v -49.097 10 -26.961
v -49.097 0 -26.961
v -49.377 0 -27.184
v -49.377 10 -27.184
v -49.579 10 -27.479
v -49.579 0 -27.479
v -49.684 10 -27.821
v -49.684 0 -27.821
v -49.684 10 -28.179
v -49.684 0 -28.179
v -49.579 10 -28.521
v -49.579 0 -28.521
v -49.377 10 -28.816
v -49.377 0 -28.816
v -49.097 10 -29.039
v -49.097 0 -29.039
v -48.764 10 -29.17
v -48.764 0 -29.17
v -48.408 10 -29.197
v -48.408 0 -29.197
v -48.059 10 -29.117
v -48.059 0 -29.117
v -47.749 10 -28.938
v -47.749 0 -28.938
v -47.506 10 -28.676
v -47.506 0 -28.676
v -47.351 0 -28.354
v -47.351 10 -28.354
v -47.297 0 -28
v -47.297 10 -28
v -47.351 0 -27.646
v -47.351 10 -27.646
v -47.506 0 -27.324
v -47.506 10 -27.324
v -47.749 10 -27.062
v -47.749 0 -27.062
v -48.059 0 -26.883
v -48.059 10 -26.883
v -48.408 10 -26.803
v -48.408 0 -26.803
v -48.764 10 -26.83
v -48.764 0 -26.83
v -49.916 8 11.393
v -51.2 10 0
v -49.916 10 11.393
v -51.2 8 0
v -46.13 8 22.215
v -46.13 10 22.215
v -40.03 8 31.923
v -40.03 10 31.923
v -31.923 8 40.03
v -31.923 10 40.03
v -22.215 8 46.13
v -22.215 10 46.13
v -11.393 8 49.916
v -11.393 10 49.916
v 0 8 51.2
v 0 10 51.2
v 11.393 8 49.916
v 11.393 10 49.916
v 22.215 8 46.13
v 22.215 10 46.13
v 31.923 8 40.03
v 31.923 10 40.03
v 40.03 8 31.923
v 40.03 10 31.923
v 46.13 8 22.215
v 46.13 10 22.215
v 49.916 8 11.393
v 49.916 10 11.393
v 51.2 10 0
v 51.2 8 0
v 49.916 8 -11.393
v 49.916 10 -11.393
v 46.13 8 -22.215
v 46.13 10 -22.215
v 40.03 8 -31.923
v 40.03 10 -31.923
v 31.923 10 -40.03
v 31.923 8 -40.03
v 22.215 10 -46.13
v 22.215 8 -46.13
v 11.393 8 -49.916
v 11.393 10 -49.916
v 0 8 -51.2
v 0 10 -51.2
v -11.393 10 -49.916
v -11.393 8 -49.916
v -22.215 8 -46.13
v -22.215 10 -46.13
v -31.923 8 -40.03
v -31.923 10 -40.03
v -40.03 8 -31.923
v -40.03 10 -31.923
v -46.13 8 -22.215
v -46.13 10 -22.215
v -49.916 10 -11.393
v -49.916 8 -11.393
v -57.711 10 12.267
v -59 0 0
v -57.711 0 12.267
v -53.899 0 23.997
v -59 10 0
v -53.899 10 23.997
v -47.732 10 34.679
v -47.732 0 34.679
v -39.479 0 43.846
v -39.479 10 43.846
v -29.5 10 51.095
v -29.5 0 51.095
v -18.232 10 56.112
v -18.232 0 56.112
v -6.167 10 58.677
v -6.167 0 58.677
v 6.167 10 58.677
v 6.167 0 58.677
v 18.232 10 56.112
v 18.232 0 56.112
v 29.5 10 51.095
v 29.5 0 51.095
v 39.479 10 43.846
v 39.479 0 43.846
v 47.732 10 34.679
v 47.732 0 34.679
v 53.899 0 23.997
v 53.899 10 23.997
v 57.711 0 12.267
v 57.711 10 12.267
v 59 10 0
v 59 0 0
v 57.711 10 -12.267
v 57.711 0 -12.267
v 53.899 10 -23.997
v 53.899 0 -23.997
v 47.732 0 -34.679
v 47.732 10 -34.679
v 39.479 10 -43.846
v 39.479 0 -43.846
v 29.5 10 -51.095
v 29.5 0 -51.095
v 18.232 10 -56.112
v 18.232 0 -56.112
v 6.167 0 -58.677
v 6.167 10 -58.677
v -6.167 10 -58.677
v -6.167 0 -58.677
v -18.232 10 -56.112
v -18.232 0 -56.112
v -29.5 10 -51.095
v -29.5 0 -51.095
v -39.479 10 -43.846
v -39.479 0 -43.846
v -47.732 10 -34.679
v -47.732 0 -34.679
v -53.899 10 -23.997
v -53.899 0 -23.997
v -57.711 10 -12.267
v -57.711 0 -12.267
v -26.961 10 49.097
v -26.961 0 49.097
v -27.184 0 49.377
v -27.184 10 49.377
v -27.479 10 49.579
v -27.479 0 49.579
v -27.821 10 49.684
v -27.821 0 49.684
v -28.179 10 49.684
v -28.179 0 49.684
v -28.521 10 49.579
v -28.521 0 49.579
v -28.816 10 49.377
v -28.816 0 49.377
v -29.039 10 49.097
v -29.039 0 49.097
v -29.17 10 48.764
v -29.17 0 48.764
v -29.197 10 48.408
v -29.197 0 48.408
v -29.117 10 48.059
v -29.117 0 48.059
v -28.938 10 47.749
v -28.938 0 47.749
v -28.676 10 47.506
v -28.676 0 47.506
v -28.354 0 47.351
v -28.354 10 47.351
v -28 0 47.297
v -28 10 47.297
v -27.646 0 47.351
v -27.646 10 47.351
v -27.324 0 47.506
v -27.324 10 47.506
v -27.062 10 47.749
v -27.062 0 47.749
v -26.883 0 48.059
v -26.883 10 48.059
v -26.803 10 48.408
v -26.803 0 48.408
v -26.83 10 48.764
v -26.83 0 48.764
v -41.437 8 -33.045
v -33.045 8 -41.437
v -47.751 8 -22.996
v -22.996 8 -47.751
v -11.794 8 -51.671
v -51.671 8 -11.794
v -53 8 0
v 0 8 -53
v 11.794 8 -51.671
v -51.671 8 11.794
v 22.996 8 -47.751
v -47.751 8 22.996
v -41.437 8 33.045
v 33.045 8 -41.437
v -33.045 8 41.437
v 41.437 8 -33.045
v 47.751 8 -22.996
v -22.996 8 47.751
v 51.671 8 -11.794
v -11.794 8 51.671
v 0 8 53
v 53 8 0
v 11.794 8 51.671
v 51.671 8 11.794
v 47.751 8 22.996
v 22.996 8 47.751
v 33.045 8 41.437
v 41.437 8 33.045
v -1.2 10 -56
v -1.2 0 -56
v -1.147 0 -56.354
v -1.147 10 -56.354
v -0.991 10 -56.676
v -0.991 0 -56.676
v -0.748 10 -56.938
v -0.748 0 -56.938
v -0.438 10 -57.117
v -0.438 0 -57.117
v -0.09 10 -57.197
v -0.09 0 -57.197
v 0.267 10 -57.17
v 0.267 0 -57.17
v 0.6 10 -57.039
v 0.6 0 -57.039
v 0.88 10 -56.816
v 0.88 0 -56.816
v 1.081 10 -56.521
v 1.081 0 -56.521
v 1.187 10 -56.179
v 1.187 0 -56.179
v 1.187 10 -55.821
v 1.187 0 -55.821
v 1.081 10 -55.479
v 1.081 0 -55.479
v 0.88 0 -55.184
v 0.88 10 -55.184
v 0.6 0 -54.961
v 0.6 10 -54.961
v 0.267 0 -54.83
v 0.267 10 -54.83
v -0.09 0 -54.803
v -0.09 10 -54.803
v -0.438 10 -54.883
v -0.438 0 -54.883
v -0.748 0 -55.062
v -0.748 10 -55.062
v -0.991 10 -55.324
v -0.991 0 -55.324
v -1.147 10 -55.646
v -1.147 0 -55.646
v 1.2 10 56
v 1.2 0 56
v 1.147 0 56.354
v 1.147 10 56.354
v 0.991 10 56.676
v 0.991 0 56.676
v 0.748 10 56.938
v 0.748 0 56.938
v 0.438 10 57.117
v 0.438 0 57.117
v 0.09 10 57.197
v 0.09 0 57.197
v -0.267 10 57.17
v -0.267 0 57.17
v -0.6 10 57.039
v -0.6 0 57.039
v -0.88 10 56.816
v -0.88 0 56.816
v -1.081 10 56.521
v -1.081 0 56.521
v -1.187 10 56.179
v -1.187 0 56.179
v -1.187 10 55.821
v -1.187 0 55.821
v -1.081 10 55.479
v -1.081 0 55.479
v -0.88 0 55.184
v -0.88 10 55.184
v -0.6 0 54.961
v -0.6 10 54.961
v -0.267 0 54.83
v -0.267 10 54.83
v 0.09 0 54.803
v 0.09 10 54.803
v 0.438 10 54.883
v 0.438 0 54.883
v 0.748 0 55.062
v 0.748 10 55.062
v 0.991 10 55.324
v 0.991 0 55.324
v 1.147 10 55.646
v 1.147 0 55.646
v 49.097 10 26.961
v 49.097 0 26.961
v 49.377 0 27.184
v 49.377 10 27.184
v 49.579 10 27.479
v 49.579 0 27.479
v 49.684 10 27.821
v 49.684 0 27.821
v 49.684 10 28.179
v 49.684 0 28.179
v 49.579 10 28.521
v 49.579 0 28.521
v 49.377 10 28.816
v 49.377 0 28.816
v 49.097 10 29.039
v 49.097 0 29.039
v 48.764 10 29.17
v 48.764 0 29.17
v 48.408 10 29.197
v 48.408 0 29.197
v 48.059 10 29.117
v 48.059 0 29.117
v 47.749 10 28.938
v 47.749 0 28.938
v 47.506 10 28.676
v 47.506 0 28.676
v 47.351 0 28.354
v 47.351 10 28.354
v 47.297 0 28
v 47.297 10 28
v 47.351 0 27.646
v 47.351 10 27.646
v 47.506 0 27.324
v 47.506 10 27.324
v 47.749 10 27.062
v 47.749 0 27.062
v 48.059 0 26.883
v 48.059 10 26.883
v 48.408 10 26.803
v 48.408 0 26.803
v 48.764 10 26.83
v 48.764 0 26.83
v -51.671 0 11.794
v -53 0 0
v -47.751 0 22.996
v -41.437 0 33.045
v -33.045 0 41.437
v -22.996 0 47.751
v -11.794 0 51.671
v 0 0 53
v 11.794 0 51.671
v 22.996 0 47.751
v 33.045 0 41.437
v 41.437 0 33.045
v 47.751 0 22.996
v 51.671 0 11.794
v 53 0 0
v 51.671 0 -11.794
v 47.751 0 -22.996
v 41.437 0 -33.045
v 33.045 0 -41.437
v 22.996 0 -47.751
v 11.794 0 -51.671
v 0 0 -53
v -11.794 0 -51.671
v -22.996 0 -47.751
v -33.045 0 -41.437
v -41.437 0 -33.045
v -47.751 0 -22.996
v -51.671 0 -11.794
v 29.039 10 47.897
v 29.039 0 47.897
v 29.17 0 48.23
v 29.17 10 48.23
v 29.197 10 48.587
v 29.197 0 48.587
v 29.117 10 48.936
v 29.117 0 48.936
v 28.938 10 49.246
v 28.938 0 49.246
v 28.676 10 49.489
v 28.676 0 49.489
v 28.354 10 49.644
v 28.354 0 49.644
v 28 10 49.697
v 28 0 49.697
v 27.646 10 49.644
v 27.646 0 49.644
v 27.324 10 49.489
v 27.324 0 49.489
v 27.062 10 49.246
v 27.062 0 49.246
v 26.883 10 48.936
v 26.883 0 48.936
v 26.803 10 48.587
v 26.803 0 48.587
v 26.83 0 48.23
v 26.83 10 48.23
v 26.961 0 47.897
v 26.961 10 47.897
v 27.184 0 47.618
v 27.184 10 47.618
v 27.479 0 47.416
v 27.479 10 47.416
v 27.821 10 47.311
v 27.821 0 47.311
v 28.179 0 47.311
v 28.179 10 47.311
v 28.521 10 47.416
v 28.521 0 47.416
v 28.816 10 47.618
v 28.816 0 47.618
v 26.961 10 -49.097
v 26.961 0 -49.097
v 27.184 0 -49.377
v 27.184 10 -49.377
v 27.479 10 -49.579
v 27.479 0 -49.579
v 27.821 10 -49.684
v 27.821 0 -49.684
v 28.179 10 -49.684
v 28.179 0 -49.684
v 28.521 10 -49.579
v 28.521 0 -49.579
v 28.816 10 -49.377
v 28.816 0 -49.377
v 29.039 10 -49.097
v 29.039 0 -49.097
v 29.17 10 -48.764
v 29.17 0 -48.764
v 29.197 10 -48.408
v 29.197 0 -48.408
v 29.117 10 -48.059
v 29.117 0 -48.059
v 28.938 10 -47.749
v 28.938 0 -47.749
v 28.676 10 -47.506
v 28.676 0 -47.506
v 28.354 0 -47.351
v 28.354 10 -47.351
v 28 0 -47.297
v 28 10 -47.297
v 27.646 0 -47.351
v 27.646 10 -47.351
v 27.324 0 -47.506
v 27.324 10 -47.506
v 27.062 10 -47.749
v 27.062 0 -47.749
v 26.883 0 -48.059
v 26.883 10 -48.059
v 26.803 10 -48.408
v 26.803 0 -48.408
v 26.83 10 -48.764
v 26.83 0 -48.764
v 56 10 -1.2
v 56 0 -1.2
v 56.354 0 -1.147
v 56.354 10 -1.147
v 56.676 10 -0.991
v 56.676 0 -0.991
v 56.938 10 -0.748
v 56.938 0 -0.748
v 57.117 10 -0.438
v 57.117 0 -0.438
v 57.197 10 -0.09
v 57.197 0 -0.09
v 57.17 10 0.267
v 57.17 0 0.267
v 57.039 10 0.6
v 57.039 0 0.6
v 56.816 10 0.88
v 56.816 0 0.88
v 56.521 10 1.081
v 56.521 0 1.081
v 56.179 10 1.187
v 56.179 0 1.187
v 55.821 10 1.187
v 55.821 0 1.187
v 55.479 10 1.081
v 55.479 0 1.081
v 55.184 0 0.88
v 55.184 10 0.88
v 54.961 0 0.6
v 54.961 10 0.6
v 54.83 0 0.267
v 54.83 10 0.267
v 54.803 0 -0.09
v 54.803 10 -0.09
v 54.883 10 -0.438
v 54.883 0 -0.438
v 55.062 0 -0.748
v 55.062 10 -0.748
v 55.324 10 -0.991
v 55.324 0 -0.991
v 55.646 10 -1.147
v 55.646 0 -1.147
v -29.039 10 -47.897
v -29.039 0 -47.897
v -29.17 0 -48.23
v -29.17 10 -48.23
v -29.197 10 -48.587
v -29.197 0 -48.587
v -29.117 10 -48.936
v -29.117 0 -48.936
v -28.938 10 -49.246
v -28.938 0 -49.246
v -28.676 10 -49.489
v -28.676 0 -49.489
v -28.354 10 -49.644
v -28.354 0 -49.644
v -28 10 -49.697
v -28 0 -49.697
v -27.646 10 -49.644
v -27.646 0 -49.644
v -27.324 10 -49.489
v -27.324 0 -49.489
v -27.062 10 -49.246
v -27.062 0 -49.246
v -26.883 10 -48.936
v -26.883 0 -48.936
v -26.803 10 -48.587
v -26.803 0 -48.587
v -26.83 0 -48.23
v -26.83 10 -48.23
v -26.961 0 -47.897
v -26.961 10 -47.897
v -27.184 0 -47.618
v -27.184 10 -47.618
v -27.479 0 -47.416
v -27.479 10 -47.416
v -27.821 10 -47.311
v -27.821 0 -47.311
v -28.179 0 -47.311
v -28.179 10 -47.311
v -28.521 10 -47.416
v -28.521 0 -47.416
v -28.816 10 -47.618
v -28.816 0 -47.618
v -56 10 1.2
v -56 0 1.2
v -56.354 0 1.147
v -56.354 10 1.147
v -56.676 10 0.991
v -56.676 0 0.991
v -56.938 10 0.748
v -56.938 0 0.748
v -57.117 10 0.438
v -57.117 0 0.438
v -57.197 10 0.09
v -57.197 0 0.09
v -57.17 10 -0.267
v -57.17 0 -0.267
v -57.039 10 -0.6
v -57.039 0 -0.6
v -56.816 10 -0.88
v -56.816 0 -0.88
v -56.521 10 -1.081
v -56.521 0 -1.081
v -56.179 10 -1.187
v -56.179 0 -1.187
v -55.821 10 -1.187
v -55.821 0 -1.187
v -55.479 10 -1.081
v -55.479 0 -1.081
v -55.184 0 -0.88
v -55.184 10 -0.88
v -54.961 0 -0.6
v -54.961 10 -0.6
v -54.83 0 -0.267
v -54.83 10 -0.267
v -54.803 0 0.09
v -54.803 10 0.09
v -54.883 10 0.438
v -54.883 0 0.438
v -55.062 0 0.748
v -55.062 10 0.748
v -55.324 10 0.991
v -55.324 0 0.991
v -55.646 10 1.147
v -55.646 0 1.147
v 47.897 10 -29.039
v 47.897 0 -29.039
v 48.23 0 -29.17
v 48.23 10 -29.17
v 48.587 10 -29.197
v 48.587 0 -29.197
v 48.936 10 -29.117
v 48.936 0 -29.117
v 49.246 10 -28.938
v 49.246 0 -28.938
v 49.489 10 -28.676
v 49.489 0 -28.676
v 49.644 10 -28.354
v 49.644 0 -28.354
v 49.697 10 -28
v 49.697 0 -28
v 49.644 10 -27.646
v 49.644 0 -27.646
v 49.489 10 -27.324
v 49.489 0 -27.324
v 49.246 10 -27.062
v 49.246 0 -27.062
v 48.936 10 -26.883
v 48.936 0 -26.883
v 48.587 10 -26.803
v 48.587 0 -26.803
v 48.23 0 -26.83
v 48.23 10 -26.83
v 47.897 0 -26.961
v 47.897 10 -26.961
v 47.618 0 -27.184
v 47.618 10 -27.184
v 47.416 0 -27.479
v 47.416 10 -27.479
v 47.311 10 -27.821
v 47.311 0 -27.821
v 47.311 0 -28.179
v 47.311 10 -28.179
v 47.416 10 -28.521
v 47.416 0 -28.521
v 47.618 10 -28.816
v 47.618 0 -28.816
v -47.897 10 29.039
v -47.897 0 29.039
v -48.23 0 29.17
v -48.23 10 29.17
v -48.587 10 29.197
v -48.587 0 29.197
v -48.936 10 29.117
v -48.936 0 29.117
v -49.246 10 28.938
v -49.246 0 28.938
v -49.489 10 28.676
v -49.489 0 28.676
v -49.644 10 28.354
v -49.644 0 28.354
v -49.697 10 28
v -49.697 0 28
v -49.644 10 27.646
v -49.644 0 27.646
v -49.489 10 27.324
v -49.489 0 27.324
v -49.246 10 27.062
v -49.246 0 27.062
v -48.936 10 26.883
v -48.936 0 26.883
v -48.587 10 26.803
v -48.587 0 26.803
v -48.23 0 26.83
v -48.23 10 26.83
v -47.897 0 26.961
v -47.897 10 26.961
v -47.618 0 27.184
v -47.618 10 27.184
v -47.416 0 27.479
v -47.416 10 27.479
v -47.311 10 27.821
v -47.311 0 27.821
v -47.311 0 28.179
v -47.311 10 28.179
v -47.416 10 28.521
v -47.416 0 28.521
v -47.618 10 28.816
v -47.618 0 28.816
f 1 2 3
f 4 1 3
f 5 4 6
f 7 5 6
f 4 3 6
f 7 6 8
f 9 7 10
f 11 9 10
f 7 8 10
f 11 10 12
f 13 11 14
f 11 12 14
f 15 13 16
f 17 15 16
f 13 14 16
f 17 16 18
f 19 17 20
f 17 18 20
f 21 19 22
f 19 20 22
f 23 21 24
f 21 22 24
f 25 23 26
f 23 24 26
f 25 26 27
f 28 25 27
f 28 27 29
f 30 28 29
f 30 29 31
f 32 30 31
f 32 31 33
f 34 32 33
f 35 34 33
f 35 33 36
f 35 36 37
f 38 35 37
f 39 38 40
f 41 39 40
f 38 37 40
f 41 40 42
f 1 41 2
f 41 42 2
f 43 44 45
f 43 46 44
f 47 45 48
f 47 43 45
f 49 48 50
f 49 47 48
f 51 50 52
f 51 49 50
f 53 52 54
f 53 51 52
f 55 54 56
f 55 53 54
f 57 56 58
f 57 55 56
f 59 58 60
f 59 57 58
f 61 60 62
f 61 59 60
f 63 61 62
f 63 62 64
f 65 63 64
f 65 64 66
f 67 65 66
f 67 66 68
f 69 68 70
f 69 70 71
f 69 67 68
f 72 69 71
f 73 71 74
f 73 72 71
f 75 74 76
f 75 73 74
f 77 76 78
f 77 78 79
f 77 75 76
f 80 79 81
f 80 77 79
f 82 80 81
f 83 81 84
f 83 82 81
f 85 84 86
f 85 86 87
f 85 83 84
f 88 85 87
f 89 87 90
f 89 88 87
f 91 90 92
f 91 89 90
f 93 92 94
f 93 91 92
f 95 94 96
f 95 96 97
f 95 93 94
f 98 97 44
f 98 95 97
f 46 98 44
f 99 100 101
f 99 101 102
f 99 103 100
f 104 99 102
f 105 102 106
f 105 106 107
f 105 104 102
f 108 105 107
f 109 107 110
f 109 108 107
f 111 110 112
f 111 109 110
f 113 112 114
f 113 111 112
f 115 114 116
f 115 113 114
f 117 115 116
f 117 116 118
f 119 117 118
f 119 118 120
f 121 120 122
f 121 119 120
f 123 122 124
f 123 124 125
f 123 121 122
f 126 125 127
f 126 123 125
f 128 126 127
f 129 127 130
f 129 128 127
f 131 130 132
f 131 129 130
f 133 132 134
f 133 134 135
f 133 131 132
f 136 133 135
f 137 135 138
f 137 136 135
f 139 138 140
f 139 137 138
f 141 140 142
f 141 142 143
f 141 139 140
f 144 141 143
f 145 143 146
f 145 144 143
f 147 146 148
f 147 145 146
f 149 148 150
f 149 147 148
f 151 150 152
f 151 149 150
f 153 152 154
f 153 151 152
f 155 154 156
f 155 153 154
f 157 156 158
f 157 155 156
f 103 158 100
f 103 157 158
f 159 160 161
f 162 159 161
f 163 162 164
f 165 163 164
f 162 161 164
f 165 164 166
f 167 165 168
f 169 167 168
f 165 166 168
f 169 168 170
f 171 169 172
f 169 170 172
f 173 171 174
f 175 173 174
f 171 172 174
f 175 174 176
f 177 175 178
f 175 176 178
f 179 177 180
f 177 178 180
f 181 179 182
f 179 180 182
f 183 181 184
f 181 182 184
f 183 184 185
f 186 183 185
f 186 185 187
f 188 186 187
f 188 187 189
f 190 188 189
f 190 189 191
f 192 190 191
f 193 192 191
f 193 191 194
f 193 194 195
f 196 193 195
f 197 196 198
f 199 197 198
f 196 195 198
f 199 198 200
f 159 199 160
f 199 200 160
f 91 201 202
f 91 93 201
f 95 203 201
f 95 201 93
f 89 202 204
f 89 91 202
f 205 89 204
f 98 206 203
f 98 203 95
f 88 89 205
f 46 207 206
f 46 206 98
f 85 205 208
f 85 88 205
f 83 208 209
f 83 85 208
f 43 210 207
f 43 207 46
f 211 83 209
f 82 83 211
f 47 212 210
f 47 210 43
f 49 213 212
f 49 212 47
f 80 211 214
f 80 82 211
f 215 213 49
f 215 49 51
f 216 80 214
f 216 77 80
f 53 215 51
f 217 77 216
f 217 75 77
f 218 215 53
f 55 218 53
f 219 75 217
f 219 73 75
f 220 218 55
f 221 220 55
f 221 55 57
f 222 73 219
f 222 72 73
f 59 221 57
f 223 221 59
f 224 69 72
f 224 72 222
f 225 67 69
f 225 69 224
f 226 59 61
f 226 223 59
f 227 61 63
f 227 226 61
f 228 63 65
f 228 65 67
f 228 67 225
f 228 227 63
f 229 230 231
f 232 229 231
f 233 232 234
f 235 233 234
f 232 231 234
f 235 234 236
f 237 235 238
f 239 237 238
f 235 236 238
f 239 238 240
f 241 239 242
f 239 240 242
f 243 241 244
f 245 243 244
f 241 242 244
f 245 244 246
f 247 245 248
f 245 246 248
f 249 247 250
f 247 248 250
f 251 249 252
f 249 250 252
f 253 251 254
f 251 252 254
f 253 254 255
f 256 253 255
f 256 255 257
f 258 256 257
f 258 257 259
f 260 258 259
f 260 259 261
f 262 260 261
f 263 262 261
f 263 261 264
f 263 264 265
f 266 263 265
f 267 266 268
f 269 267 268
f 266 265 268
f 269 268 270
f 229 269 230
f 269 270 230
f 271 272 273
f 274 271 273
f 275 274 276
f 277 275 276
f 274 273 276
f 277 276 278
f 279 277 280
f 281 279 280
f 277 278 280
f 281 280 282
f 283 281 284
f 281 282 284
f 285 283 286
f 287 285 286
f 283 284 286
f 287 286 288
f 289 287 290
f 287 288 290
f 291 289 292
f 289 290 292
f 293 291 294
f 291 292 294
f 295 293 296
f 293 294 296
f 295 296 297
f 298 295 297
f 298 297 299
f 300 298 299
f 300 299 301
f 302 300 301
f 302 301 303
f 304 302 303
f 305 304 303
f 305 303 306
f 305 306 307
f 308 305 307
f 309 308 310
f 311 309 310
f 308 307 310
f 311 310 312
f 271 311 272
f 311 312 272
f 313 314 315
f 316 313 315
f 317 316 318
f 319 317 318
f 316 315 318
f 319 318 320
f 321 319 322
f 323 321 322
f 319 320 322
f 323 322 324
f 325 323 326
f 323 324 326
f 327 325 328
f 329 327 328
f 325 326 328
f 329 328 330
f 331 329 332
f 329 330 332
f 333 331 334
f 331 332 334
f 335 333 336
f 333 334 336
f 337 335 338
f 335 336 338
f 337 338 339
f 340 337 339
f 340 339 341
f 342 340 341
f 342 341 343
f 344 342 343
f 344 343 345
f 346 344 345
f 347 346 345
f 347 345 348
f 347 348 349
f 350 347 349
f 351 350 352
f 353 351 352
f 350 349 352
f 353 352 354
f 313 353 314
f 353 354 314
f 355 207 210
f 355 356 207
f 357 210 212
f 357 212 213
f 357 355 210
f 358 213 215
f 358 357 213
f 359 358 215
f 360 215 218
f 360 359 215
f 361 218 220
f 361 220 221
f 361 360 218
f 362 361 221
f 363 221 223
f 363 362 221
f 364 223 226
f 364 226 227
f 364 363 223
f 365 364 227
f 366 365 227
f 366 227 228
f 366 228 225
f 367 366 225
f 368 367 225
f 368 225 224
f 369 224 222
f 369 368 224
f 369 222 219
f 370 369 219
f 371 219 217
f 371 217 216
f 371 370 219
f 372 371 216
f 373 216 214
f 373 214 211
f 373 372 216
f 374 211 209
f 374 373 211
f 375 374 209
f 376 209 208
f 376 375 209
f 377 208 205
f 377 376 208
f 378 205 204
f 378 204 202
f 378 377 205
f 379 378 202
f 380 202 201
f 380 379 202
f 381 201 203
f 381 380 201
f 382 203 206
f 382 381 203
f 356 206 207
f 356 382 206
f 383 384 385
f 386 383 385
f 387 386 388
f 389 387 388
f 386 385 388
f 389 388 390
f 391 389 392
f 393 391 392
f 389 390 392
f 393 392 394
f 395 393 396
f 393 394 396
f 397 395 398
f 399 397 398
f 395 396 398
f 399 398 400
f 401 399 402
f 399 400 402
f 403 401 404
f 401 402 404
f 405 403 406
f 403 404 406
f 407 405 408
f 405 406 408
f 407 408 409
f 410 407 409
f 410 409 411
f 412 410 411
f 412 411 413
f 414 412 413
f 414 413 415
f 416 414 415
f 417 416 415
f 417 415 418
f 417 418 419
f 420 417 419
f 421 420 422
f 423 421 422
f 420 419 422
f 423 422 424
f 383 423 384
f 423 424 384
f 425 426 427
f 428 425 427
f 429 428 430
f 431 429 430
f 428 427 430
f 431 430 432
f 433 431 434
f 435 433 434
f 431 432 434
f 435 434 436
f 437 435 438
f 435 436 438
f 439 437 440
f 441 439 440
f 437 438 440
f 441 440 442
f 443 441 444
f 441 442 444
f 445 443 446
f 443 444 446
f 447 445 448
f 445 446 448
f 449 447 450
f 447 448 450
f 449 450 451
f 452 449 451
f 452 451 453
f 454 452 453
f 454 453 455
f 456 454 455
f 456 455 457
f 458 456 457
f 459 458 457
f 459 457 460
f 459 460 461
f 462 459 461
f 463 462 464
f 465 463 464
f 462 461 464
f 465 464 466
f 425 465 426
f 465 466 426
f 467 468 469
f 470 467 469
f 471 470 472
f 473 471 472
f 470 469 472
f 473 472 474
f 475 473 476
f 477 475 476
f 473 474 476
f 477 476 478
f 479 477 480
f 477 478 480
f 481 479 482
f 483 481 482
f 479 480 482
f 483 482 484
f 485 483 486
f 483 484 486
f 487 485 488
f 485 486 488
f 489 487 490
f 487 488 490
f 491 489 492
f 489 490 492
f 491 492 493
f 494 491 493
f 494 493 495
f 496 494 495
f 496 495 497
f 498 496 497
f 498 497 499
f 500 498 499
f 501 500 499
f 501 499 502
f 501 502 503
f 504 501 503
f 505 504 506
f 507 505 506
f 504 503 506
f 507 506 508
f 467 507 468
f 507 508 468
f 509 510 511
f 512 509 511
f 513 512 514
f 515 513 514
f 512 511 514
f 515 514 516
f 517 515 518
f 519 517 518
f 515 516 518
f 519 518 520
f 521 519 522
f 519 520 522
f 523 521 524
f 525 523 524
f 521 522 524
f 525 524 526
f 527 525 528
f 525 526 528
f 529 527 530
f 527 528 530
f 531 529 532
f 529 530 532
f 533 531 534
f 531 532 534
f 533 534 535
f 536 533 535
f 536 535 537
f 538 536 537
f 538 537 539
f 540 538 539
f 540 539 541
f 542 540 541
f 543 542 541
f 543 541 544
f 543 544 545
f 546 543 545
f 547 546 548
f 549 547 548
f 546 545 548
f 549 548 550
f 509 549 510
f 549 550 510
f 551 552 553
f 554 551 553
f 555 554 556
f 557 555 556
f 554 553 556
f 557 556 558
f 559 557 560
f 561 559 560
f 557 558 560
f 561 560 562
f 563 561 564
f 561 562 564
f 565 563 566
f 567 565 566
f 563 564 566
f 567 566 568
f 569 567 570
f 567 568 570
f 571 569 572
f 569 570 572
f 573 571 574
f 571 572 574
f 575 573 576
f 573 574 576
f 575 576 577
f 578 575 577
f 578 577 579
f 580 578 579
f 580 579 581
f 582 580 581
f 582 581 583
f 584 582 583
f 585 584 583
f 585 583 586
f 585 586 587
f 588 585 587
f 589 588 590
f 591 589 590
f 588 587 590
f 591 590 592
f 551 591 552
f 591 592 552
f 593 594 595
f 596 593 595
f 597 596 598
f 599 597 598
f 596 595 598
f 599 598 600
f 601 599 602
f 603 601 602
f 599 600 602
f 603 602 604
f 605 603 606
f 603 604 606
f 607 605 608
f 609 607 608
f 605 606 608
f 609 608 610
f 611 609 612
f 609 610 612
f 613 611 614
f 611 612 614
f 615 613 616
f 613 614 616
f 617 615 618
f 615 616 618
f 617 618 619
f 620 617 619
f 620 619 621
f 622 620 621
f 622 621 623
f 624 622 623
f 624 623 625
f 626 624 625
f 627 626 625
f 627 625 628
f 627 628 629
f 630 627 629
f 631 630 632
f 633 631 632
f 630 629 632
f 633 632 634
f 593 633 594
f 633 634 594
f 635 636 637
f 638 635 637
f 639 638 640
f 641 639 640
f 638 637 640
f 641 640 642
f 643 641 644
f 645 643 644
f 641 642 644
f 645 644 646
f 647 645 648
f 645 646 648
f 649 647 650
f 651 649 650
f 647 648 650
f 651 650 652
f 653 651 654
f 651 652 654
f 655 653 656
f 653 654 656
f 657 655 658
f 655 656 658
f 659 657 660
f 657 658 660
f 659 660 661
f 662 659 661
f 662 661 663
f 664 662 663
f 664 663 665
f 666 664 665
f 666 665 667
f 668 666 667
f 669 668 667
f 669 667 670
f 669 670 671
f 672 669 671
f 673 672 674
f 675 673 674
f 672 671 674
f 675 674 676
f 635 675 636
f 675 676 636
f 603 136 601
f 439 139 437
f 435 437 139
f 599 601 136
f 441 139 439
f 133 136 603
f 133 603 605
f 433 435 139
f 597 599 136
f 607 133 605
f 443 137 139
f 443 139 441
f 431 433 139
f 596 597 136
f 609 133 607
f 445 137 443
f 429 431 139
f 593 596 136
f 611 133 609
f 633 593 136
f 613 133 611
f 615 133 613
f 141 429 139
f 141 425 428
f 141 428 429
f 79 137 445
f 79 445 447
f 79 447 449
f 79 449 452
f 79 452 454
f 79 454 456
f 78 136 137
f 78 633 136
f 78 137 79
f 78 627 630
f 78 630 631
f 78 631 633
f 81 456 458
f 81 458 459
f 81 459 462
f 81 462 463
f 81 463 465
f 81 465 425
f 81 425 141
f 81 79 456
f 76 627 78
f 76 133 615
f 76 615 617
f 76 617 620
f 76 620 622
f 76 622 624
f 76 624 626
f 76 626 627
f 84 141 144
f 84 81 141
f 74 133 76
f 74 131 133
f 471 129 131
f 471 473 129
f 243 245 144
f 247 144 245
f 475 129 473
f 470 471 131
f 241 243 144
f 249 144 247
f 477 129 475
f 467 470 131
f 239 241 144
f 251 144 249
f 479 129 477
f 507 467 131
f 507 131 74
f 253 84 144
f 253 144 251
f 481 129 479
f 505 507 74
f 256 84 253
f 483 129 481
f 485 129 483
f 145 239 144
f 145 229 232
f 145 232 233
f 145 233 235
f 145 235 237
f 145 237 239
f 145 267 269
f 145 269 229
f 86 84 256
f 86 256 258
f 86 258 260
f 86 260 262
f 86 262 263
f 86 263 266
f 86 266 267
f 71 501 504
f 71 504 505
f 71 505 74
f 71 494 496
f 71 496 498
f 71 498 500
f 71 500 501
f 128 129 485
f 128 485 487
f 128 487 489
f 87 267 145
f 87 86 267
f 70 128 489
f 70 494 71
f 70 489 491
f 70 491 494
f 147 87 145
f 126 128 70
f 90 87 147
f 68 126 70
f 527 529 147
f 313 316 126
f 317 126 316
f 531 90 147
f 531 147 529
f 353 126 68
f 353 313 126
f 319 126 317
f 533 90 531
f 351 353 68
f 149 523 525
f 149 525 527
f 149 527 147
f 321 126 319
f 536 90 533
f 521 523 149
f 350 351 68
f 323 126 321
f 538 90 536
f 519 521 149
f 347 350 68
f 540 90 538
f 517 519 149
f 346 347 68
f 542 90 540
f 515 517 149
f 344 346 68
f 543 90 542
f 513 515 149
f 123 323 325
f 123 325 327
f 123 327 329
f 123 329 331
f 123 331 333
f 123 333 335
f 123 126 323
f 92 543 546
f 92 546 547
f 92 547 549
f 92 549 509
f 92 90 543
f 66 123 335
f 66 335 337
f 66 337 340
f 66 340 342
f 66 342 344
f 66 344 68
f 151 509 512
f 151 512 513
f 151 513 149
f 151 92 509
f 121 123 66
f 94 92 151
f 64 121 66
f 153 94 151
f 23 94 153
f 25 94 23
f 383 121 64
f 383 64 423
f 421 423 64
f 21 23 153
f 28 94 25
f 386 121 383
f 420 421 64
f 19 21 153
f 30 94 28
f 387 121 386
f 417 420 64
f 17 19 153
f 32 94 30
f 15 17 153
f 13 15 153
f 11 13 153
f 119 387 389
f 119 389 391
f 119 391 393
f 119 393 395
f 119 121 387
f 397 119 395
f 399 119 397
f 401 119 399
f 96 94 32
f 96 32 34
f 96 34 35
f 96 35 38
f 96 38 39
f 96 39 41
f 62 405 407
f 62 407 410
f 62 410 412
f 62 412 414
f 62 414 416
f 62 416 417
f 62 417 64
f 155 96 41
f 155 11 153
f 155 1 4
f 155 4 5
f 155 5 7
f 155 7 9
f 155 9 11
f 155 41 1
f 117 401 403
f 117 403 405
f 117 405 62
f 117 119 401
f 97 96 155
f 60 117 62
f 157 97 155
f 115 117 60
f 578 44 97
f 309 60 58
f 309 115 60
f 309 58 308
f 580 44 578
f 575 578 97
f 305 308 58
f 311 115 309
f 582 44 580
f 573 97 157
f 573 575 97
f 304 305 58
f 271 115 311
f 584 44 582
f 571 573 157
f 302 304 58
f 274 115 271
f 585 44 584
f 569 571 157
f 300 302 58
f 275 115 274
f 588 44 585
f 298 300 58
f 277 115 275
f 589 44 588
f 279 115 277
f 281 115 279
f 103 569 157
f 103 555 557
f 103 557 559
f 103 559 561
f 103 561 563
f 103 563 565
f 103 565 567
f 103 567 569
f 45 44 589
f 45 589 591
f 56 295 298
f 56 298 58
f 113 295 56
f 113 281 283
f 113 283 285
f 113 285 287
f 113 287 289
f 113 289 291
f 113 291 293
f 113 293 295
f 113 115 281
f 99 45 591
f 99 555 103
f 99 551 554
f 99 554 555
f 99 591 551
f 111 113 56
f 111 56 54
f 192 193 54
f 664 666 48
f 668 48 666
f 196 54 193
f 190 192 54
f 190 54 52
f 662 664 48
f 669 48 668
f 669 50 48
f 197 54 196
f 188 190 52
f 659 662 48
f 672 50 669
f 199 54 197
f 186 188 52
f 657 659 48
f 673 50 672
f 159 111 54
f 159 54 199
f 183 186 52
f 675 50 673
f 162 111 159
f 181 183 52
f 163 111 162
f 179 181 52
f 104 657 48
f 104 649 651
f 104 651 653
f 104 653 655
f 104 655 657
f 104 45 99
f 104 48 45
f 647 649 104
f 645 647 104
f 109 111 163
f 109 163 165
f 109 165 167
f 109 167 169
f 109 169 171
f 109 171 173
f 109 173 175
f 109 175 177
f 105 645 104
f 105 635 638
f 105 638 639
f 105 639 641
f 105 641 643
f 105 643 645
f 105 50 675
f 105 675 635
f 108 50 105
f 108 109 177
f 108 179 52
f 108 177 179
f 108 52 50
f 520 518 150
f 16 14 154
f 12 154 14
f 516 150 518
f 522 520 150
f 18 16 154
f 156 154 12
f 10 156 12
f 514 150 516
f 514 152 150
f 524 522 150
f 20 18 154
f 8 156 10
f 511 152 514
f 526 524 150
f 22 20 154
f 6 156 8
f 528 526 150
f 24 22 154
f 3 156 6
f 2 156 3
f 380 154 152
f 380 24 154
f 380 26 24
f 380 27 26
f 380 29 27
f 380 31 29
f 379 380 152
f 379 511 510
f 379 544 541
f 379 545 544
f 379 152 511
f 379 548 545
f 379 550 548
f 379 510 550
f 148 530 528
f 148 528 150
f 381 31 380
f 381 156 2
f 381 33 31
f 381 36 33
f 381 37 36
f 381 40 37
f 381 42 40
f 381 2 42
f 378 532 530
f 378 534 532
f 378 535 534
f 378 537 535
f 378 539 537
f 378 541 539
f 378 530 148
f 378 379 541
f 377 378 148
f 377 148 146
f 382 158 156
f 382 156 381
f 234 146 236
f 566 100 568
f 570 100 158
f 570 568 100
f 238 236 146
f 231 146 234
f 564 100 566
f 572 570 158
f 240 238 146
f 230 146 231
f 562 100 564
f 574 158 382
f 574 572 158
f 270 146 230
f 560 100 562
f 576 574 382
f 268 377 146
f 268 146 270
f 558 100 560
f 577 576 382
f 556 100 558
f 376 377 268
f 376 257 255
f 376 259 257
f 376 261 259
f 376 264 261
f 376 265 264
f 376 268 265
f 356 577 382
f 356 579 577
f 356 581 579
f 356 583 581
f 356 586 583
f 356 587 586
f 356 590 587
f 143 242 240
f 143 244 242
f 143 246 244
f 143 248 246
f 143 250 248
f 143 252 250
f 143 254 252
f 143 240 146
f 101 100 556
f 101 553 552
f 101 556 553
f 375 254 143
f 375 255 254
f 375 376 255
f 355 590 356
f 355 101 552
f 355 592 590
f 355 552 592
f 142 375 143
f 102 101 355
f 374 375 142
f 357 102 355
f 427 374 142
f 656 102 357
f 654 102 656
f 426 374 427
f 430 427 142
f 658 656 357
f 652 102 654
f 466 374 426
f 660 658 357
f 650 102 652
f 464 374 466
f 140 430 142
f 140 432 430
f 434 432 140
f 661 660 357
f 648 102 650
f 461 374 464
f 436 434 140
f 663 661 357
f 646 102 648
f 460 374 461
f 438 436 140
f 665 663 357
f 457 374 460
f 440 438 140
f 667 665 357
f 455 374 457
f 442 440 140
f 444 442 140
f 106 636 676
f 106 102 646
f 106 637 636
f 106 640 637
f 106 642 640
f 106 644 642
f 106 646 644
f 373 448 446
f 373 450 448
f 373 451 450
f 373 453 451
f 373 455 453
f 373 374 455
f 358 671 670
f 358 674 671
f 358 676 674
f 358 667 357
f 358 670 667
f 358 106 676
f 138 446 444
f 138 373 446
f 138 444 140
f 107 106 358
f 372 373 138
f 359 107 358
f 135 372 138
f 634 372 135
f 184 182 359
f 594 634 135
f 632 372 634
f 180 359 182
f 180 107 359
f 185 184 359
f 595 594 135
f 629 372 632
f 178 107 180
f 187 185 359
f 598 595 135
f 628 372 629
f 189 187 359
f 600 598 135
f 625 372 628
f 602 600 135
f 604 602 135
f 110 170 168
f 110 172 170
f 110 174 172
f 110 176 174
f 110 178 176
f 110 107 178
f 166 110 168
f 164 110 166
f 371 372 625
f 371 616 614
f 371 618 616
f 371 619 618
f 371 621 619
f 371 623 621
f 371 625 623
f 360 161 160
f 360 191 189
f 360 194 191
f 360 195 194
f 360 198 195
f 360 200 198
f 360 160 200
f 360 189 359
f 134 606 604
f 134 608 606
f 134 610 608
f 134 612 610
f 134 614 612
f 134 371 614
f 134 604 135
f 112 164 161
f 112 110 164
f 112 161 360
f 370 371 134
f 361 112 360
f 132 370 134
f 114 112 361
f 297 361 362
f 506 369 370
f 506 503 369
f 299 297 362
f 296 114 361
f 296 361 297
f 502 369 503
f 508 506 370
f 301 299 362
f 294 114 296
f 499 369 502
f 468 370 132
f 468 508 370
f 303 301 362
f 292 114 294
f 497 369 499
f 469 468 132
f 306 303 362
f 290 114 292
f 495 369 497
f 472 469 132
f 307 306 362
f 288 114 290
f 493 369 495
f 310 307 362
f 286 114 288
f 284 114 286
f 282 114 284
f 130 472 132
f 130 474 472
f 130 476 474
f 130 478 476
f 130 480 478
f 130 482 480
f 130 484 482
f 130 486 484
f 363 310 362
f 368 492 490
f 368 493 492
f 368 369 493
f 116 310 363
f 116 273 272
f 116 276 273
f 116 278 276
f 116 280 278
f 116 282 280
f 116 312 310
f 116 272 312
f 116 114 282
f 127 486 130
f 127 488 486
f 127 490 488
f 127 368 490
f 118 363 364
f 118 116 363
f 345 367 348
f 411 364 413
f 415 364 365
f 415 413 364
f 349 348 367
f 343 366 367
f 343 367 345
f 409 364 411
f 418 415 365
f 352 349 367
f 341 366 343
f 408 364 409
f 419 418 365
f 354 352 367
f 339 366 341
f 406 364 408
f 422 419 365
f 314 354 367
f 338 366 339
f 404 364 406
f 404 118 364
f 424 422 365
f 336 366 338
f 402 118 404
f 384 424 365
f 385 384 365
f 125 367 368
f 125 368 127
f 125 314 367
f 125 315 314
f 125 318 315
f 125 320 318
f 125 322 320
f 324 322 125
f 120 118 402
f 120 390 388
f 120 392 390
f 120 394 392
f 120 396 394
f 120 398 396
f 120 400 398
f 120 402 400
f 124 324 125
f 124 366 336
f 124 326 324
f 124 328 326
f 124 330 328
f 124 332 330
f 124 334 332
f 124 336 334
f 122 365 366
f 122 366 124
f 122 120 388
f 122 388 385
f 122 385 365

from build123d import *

# Parameters (mm, degrees)
SKETCH_2_R               = 1.2
CUT_EXTRUDE_1_DEPTH      = 10
PATTERN_CIRCULAR_1_COUNT = 12


with BuildPart() as part:
    # 草图1 → 旋转1 (revolve)
    with BuildSketch(Plane.XY):
        Polygon((-53, 0), (-59, 0), (-59, 10), (-51.2, 10), (-51.2, 8), (-53, 8), align=None)
    revolve(axis=Axis((0, 0, 0), (0, 1, 0)))

    # 草图2 → 切除-拉伸1 (cut)
    with BuildSketch(Plane.XZ):
        with Locations((0, 56)):
            Circle(SKETCH_2_R)
    cut_extrude_1 = extrude(amount=-CUT_EXTRUDE_1_DEPTH, mode=Mode.SUBTRACT)

    # 阵列(圆周)1: 切除-拉伸1 ×12 about axis
    pattern_circular_1_axis = Axis((0, 0, 0), (0, 1, 0))
    for i in range(1, PATTERN_CIRCULAR_1_COUNT):
        add(cut_extrude_1.rotate(pattern_circular_1_axis, i * 360 / PATTERN_CIRCULAR_1_COUNT), mode=Mode.SUBTRACT)


solid = part.part
